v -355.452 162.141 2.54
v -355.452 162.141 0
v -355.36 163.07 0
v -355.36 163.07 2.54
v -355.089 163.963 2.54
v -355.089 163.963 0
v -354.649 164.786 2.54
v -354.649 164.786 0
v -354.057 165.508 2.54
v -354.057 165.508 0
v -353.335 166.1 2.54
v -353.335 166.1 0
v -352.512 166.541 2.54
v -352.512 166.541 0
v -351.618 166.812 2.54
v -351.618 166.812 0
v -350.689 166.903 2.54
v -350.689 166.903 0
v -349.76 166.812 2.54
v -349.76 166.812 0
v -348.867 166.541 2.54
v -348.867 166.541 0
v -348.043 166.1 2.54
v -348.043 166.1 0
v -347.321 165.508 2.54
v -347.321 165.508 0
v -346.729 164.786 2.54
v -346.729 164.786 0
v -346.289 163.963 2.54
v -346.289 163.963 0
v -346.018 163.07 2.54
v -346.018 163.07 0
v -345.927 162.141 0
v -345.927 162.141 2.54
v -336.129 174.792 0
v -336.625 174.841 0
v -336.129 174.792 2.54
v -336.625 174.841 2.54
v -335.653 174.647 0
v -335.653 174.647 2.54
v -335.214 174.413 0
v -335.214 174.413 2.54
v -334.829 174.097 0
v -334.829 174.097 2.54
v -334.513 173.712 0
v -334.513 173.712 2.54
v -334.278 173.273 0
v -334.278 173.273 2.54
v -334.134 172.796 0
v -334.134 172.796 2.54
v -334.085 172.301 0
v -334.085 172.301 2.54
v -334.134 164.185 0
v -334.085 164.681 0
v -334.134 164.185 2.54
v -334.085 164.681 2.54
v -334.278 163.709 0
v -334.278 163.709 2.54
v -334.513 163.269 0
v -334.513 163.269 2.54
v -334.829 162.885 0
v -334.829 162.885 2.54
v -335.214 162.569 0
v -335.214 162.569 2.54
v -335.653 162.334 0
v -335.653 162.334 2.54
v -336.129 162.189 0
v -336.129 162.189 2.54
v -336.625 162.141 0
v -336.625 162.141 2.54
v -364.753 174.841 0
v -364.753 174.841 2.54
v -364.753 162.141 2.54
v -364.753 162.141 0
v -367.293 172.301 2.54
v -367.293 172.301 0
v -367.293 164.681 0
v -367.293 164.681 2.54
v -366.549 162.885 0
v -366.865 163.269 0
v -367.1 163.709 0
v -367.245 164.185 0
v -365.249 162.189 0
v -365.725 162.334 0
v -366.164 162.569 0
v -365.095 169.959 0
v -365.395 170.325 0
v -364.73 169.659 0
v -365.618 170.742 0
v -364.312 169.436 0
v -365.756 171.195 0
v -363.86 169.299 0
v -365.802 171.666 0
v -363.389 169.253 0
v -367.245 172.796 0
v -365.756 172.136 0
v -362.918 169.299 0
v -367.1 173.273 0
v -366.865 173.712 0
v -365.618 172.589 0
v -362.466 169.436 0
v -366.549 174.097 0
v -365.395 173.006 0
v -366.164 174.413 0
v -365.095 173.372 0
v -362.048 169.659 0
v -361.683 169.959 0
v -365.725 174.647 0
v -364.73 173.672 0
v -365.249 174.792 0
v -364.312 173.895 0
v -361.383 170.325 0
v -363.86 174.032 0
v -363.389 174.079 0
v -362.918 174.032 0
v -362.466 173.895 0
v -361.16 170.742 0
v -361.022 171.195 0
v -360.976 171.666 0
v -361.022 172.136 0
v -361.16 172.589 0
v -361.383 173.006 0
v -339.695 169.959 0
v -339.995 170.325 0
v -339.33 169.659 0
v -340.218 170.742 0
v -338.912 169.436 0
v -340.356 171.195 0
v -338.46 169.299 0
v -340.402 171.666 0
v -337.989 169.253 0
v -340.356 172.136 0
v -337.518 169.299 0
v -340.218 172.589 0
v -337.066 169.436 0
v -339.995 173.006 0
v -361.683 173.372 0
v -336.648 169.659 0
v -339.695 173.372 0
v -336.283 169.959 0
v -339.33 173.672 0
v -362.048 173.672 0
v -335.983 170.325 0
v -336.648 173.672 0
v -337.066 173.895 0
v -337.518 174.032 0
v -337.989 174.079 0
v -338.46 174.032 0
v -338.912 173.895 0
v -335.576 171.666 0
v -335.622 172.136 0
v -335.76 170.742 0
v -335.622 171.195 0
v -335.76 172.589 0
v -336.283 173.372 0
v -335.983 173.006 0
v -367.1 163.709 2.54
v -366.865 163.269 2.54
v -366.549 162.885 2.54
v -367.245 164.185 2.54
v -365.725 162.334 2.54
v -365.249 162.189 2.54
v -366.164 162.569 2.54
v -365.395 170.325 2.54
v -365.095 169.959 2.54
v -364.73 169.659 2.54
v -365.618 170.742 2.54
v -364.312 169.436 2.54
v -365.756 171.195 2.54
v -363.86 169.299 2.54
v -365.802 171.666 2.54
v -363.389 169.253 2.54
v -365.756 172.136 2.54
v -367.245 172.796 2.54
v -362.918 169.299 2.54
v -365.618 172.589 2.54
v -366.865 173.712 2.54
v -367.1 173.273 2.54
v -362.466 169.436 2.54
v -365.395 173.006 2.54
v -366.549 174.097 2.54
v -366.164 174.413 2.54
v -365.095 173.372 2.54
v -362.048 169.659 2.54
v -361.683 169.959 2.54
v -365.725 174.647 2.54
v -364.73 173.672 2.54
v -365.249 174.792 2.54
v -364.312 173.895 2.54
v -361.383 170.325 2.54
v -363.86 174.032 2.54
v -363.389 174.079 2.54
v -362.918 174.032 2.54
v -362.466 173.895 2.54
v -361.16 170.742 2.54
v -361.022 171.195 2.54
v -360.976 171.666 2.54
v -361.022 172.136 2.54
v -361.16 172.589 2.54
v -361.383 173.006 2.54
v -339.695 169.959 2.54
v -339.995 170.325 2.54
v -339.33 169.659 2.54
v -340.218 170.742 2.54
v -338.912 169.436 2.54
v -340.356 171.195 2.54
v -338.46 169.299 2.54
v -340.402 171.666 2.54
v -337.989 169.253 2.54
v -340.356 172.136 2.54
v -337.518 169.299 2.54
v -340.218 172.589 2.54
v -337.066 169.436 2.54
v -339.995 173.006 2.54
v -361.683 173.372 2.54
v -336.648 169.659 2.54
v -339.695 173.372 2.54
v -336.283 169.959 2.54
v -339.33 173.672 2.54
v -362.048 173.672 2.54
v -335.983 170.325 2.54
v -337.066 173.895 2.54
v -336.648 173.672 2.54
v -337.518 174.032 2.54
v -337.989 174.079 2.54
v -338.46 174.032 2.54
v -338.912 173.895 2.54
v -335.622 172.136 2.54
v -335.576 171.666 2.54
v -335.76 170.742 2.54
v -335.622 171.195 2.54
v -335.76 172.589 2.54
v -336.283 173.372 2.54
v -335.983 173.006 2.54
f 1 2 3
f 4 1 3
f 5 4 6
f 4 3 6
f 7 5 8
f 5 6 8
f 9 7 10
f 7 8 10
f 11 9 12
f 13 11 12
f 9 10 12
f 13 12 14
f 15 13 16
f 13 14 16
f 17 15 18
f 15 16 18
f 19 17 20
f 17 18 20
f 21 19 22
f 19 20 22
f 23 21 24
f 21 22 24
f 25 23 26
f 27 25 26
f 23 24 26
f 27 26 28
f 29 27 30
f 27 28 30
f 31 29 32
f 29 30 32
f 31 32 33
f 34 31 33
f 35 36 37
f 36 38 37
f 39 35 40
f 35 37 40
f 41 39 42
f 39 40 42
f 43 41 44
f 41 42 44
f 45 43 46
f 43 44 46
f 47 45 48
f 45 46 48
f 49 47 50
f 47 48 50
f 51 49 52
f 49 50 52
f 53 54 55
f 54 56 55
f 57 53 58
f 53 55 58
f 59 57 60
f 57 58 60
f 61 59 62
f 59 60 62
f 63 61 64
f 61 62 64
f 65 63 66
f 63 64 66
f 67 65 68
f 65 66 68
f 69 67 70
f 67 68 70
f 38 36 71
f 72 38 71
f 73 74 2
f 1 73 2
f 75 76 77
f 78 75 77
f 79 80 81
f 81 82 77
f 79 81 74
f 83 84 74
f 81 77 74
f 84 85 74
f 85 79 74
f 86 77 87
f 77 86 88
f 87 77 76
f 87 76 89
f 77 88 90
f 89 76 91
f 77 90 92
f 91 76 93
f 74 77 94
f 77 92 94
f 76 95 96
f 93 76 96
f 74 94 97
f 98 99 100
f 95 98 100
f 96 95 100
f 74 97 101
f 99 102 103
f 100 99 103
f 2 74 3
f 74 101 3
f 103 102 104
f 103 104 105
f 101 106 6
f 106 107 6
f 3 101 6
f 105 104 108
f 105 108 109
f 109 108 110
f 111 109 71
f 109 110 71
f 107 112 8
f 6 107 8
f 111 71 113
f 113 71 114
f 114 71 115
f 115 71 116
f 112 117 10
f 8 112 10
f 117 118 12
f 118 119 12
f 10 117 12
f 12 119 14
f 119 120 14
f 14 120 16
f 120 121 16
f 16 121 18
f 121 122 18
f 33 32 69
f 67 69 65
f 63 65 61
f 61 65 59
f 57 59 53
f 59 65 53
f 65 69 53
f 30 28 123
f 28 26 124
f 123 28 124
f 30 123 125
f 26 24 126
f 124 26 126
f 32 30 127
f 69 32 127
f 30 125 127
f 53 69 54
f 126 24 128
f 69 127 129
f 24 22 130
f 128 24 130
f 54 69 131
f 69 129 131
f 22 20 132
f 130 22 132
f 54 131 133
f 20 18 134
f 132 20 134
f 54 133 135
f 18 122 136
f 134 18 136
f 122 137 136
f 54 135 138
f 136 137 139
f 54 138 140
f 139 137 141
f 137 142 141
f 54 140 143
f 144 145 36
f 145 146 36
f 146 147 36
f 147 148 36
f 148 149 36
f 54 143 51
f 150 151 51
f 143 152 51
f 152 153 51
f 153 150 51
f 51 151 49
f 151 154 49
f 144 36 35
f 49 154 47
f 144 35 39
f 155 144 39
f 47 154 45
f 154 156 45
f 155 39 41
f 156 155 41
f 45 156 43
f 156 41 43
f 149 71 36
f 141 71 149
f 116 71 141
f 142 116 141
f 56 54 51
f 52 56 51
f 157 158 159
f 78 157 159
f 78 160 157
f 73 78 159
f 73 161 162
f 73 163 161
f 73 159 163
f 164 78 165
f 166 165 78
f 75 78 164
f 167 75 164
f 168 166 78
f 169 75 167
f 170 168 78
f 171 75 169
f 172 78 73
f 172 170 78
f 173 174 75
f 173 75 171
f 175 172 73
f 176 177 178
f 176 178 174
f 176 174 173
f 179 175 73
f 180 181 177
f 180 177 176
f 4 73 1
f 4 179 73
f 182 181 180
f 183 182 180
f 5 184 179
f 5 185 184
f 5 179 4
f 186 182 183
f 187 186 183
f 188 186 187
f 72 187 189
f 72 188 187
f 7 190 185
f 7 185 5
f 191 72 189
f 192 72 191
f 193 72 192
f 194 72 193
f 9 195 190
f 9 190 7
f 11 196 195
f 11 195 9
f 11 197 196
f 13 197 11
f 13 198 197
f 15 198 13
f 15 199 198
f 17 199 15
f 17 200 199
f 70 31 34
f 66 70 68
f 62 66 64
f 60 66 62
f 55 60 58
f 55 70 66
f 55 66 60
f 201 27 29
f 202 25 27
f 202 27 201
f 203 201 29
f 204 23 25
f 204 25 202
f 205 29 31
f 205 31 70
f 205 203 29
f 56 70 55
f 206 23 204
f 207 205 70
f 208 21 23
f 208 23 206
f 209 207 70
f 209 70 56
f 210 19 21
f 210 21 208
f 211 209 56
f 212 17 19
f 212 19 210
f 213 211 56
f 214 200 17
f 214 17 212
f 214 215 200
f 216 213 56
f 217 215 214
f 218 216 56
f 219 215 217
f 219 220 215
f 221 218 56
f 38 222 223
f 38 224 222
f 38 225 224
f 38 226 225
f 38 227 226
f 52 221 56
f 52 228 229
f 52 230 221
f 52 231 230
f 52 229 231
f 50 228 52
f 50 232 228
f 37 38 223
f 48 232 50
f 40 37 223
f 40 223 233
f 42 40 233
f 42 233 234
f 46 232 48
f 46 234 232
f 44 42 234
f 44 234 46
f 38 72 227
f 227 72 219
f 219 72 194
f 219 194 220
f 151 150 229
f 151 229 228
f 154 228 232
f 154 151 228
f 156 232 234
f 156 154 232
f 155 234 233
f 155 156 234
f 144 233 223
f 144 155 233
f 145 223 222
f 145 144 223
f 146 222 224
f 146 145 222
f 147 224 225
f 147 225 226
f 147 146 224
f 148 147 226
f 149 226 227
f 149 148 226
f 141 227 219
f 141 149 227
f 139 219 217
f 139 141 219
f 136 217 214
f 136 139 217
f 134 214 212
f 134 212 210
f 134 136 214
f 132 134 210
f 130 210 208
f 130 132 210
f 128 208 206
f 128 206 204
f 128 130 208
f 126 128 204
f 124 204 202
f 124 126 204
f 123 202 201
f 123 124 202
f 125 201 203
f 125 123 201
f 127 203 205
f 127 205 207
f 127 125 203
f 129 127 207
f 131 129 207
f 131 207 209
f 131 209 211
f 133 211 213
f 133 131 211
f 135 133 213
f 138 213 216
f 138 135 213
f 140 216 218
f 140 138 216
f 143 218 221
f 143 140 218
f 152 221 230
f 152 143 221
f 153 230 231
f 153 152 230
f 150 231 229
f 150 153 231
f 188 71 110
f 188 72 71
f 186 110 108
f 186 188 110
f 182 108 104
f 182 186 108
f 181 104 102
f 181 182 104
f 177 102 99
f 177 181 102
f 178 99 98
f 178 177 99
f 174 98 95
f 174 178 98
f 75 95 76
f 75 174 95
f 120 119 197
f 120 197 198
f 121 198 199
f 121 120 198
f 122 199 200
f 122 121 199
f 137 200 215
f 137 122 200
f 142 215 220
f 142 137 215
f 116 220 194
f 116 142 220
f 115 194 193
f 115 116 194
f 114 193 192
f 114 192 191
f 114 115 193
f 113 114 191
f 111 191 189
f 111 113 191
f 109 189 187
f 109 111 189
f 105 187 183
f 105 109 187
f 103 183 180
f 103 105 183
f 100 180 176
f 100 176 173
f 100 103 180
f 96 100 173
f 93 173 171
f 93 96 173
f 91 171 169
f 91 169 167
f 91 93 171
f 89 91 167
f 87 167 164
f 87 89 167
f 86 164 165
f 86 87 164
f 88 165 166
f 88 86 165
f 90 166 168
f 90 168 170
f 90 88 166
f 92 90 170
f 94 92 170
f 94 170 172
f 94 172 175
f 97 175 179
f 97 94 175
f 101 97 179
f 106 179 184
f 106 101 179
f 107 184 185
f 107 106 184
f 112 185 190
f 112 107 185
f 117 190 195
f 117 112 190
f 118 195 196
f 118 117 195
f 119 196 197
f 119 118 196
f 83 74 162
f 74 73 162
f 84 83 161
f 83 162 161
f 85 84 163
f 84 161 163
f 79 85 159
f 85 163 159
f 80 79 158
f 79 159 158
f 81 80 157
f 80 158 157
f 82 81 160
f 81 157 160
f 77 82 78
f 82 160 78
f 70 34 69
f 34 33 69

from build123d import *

# Parameters (mm, degrees)
SKETCH1_R           = 2.413
BOSS_EXTRUDE1_DEPTH = 2.54
FILLET1_R           = 2.54


with BuildPart() as part:
    # Sketch1 → Boss-Extrude1 (new body)
    # profile 1 of 2: a face of its own
    with BuildSketch(Plane.XY):
        with BuildLine():
            Line((-367.293338715, 162.140585859), (-357.133338715, 162.140585859))
            ThreePointArc((-357.133338715, 162.140585859), (-350.689077681, 168.584846892), (-344.244816647, 162.140585859))
            Line((-344.244816647, 162.140585859), (-334.084816647, 162.140585859))
            Line((-334.084816647, 162.140585859), (-334.084816647, 174.840585859))
            Line((-334.084816647, 174.840585859), (-367.293338715, 174.840585859))
            Line((-367.293338715, 174.840585859), (-367.293338715, 162.140585859))
        make_face()
        with Locations((-363.389077681, 171.665585859)):
            Circle(SKETCH1_R, mode=Mode.SUBTRACT)
        with Locations((-337.989077681, 171.665585859)):
            Circle(SKETCH1_R, mode=Mode.SUBTRACT)
    # profile 2 of 2: a face of its own
    with BuildSketch(Plane.XY):
        with BuildLine():
            ThreePointArc((-344.244816647, 162.140585859), (-350.689077681, 168.584846892), (-357.133338715, 162.140585859))
            Line((-357.133338715, 162.140585859), (-355.451577681, 162.140585859))
            ThreePointArc((-355.451577681, 162.140585859), (-350.689077681, 166.903085859), (-345.926577681, 162.140585859))
            Line((-345.926577681, 162.140585859), (-344.244816647, 162.140585859))
        make_face()
    extrude(amount=BOSS_EXTRUDE1_DEPTH)

    # Fillet1
    fillet1_edges = [part.edges().sort_by_distance(p)[0] for p in [
        (-367.293338715, 162.140585859, 1.27),
        (-367.293338715, 174.840585859, 1.27),
        (-334.084816647, 174.840585859, 1.27),
        (-334.084816647, 162.140585859, 1.27),
    ]]
    fillet(fillet1_edges, radius=FILLET1_R)


solid = part.part
